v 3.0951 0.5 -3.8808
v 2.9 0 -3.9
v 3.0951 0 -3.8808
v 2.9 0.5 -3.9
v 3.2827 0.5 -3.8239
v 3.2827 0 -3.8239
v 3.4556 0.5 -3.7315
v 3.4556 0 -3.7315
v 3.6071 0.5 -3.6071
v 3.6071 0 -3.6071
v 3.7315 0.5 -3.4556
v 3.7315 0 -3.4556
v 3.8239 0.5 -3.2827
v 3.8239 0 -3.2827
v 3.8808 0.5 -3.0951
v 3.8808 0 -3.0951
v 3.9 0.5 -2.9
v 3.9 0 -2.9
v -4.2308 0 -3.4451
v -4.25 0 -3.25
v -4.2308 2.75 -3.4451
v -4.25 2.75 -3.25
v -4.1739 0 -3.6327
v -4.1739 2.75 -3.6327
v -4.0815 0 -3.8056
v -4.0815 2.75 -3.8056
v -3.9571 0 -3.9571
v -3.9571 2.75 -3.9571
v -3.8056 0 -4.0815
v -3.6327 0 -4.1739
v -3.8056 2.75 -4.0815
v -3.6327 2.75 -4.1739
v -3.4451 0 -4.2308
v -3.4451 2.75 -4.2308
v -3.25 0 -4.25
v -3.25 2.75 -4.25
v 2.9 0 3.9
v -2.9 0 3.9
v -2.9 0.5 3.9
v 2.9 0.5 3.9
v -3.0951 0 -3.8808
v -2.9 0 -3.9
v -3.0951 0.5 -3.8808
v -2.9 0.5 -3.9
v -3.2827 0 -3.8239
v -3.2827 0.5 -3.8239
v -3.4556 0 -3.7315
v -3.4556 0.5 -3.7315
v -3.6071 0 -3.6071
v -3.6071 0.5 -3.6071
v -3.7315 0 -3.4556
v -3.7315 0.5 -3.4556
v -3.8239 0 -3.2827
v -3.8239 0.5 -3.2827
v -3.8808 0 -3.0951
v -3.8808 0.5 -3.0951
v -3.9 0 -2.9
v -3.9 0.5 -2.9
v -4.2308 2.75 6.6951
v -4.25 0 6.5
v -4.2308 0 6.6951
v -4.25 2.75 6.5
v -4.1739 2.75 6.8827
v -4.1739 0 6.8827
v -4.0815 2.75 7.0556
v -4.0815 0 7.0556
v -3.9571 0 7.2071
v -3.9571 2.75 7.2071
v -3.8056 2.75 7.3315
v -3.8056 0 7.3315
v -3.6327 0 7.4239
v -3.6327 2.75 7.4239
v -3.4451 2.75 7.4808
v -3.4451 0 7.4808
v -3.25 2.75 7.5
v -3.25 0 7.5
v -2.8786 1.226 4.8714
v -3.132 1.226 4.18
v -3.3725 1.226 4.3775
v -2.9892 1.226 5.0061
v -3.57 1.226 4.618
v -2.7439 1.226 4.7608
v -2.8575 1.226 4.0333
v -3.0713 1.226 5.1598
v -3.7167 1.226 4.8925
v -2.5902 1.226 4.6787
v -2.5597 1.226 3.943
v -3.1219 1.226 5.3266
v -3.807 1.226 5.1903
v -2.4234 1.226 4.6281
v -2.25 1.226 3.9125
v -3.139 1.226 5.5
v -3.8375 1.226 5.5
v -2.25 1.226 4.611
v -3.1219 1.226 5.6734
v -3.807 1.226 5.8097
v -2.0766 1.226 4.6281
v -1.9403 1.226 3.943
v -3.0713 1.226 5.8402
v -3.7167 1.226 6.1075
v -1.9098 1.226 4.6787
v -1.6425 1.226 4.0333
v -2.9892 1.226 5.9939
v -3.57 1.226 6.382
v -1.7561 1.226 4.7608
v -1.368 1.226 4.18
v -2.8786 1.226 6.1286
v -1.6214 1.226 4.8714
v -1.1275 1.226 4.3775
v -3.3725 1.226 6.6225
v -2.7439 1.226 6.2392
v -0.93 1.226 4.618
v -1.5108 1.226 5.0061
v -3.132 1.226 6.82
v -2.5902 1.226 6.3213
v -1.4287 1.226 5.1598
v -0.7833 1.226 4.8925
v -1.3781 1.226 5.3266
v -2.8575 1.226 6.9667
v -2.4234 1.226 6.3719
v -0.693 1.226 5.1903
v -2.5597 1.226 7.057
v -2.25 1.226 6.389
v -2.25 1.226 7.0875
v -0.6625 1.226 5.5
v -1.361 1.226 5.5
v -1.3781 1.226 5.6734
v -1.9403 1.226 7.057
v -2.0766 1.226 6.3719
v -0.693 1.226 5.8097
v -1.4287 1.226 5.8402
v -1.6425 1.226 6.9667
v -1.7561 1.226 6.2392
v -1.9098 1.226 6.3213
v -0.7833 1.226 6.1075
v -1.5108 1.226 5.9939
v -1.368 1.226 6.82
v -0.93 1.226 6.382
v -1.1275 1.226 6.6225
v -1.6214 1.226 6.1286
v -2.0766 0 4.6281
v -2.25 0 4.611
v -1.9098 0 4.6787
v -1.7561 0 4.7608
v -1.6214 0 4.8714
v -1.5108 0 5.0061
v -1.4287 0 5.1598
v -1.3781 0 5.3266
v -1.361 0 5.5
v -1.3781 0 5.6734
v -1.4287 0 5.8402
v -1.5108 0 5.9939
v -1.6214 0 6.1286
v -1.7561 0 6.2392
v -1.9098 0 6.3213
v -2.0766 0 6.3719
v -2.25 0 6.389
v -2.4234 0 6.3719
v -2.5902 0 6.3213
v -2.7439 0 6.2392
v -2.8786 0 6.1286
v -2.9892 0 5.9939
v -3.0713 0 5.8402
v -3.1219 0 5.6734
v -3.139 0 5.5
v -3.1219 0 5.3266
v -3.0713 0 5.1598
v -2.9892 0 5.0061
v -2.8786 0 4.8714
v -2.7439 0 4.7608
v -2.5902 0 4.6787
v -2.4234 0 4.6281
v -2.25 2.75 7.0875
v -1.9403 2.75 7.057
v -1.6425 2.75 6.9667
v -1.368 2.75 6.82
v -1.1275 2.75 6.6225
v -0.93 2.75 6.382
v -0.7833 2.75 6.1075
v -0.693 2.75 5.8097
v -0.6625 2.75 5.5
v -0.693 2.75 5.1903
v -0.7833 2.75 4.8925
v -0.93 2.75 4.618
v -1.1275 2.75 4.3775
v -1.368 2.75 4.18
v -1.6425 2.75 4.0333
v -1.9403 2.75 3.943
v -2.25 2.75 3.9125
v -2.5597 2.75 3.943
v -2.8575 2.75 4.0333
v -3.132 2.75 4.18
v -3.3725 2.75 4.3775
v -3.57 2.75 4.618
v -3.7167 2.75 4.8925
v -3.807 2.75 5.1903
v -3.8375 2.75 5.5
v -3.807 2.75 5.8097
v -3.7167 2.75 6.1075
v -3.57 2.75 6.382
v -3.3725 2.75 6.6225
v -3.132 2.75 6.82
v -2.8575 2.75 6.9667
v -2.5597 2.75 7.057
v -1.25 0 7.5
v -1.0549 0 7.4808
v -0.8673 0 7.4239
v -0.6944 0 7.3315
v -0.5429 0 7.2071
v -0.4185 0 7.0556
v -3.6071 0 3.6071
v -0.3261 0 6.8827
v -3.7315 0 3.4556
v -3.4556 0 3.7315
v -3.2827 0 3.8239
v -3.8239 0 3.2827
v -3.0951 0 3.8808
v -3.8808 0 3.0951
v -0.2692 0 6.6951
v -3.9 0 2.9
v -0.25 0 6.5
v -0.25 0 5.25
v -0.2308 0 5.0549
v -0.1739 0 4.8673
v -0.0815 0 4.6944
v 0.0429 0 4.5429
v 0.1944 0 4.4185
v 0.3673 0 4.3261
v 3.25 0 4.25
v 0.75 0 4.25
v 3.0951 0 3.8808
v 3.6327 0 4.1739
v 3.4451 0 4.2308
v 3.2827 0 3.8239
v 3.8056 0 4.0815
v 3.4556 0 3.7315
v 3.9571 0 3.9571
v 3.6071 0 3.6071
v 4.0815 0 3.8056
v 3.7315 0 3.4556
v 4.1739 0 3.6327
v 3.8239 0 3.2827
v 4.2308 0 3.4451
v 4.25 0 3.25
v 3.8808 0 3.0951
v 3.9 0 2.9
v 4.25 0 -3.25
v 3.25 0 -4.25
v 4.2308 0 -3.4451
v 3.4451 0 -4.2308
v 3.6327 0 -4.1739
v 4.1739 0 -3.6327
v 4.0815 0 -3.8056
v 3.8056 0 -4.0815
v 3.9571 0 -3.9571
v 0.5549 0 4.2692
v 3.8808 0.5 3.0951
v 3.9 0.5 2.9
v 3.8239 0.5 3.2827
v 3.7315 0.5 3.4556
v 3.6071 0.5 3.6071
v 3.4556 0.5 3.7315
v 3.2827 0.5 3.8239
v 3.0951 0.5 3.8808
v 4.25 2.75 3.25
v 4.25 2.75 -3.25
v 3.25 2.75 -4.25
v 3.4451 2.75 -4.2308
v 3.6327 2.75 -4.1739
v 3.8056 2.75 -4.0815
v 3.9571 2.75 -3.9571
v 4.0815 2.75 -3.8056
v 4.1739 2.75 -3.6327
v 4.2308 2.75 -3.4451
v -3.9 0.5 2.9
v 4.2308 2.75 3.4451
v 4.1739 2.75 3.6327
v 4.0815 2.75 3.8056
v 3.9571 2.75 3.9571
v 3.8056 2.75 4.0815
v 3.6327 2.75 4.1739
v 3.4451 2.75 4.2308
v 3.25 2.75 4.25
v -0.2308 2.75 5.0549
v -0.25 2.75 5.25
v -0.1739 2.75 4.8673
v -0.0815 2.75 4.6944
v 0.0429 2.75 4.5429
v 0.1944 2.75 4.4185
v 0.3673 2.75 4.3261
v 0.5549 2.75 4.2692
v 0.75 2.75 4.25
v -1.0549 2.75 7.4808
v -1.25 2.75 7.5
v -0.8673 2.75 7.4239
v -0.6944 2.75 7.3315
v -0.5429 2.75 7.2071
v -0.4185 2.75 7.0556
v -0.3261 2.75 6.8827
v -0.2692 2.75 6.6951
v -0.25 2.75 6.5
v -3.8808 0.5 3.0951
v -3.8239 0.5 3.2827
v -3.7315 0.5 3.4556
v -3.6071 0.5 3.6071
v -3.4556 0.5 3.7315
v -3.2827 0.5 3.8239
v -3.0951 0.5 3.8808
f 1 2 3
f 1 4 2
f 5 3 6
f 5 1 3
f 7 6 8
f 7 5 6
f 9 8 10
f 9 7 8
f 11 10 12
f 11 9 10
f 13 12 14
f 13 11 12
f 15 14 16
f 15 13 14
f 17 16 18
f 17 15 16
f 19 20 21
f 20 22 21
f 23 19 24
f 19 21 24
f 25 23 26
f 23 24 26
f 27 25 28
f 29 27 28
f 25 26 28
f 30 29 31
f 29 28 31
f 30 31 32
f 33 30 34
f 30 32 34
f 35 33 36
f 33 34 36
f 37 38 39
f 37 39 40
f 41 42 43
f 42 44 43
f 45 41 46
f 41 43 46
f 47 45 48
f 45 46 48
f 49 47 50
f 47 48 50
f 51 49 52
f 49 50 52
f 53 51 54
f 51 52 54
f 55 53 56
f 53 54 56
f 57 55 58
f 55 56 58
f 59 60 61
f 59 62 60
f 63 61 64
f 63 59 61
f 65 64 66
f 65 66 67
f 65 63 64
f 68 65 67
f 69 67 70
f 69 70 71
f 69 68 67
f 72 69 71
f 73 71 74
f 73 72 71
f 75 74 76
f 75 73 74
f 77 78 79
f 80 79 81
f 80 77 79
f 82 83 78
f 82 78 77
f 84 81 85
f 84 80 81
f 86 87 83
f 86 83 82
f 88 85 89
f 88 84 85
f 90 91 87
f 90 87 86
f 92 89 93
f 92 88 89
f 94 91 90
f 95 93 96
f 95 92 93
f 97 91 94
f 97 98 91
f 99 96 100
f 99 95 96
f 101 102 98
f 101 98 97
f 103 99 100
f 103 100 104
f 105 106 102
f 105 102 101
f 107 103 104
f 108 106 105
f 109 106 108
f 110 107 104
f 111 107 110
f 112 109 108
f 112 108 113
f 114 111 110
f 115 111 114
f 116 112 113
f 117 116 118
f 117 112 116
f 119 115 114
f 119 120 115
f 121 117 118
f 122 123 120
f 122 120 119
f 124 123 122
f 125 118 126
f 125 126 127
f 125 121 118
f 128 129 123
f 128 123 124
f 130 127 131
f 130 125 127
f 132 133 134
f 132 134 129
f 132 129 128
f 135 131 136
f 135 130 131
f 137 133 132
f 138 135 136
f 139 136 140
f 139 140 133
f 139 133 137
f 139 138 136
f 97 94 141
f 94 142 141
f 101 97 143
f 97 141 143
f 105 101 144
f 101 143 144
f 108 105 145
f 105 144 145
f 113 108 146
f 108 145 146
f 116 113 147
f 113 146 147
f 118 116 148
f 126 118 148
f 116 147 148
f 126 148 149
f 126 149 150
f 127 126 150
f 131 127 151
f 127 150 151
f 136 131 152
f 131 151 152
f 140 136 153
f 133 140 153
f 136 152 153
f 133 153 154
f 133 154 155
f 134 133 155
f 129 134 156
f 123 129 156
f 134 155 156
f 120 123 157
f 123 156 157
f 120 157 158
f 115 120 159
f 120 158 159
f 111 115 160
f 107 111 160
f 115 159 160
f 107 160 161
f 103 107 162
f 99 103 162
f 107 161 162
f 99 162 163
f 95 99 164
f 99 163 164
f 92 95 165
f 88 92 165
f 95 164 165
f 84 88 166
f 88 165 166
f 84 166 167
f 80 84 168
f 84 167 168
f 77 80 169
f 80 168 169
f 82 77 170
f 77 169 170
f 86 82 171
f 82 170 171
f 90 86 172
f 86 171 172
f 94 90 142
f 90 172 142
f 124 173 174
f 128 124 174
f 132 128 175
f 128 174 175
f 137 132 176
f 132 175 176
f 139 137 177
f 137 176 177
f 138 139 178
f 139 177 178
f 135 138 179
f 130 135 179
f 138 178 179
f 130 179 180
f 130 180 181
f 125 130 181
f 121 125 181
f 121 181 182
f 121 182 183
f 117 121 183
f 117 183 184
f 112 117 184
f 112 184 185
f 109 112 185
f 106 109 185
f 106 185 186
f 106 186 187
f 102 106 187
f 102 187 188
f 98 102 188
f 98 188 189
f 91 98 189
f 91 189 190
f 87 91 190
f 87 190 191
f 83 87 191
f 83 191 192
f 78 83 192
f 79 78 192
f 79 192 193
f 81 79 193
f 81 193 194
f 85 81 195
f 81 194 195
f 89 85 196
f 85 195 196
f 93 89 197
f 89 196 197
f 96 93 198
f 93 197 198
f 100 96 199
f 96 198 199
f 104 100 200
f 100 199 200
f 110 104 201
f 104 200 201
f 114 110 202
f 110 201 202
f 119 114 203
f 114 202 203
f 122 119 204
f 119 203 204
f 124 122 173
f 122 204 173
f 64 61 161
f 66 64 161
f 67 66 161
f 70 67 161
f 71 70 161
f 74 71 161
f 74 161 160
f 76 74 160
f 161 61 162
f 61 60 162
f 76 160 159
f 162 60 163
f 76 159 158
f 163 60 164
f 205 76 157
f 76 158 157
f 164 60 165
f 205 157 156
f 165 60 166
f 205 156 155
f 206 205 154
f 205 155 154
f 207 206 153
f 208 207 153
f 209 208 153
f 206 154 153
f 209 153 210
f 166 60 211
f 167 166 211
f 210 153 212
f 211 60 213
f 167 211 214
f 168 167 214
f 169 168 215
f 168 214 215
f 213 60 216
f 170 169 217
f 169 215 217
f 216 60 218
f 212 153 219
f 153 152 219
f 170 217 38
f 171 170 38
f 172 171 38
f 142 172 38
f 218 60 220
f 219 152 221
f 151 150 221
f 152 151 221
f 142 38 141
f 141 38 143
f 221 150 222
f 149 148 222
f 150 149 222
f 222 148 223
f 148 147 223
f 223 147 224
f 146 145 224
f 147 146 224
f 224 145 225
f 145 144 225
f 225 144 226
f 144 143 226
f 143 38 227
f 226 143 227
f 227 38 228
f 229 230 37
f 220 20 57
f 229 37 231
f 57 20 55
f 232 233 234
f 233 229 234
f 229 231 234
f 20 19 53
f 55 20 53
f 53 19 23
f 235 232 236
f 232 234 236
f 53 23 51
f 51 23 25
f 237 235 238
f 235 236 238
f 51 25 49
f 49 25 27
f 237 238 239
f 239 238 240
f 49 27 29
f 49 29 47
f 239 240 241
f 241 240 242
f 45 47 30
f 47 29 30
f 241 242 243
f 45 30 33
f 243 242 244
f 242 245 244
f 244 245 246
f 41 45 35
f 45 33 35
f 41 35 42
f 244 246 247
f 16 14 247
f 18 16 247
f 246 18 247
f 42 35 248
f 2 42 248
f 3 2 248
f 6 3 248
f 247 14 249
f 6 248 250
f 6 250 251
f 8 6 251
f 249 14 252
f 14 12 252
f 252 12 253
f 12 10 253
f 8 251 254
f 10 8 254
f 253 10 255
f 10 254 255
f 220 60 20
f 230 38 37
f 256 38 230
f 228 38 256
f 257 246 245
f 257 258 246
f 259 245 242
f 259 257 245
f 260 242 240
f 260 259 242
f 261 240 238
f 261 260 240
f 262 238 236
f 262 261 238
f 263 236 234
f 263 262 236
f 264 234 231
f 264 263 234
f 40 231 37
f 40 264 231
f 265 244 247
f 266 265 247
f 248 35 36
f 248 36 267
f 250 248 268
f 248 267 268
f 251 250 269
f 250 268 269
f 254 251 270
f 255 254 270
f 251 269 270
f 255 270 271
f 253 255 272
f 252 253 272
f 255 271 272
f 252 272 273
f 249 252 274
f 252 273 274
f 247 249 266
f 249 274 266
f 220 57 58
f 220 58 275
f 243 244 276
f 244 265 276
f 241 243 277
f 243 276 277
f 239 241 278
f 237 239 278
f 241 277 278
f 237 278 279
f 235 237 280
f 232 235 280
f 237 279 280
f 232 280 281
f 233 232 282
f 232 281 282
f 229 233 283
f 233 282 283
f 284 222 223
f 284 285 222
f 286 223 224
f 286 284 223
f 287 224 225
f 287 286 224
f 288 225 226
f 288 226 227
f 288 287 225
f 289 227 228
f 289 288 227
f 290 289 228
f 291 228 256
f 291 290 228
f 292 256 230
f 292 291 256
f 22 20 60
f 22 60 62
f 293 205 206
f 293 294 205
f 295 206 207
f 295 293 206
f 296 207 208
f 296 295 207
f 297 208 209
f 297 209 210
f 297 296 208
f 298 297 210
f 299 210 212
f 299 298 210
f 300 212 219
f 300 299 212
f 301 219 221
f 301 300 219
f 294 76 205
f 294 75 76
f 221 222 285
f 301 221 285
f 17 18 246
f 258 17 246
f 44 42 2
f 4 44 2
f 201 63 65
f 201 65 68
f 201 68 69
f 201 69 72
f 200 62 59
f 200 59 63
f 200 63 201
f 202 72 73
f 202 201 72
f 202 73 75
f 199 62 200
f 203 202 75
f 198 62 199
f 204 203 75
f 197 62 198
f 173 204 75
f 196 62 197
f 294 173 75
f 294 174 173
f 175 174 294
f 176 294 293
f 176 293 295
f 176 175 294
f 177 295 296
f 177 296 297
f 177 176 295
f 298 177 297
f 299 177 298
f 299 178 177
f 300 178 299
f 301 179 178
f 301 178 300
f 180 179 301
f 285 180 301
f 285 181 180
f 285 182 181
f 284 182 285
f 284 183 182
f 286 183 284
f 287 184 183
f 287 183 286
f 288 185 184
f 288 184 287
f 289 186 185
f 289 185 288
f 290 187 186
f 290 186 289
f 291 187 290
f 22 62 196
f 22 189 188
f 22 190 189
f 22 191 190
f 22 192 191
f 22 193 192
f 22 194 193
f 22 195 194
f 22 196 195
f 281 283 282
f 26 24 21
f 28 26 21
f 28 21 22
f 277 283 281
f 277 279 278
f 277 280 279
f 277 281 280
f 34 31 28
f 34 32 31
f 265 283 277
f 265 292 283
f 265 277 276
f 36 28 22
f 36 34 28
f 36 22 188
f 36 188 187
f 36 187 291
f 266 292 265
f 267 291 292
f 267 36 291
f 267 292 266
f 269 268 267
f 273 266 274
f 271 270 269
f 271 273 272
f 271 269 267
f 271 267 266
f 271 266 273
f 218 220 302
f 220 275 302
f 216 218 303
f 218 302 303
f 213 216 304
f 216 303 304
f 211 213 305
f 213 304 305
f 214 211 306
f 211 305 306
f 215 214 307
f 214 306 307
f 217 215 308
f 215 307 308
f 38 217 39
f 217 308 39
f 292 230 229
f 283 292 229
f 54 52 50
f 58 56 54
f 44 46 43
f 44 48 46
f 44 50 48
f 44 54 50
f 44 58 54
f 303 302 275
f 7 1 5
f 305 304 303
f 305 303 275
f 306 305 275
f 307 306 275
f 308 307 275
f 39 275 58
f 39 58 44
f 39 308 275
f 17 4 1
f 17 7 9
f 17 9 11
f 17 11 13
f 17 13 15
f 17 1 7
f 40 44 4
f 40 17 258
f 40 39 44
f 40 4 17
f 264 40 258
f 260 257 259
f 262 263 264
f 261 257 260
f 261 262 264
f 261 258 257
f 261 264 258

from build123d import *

# Parameters (mm, degrees)
SKETCH1_W                                      = 8.5
SKETCH1_H                                      = 8.5
EXTRUDE1_DEPTH                                 = 2.75
SKETCH8_W                                      = 7.8
SKETCH8_H                                      = 7.8
EXTRUDE6_DEPTH                                 = 0.5
SKETCH3_W                                      = 4
SKETCH3_H                                      = 2.75
EXTRUDE3_DEPTH                                 = 3.25
CBORE_FOR_0_SOCKET_HEAD_CAP_SCREW1_D           = 1.778
CBORE_FOR_0_SOCKET_HEAD_CAP_SCREW1_CBORE_D     = 3.175
CBORE_FOR_0_SOCKET_HEAD_CAP_SCREW1_CBORE_DEPTH = 1.524
FILLET1_R                                      = 1


with BuildPart() as part:
    # Sketch1 → Extrude1 (new body)
    with BuildSketch(Plane(origin=(0, 0, 0), x_dir=(1, 0, 0), z_dir=(0, 1, 0))):
        Rectangle(SKETCH1_W, SKETCH1_H)
    extrude(amount=EXTRUDE1_DEPTH)

    # Sketch8 → Extrude6 (cut)
    with BuildSketch(Plane.XZ):
        Rectangle(SKETCH8_W, SKETCH8_H)
    extrude(amount=-EXTRUDE6_DEPTH, mode=Mode.SUBTRACT)

    # Sketch3 → Extrude3 (add)
    with BuildSketch(Plane.XY.offset(4.25)):
        with Locations((-2.25, 1.375)):
            Rectangle(SKETCH3_W, SKETCH3_H)
    extrude(amount=EXTRUDE3_DEPTH)

    # CBORE for #0 Socket Head Cap Screw1 (through all)
    with Locations(Plane(origin=(-2.25, 2.75, 5.5), x_dir=(0, 0, 1), z_dir=(0, 1, 0))):
        with Locations((0, 0)):
            CounterBoreHole(CBORE_FOR_0_SOCKET_HEAD_CAP_SCREW1_D / 2, CBORE_FOR_0_SOCKET_HEAD_CAP_SCREW1_CBORE_D / 2, CBORE_FOR_0_SOCKET_HEAD_CAP_SCREW1_CBORE_DEPTH)

    # Fillet1
    fillet1_edges = [part.edges().sort_by_distance(p)[0] for p in [
        (-3.9, 0.25, 3.9),
        (-3.9, 0.25, -3.9),
        (3.9, 0.25, -3.9),
        (3.9, 0.25, 3.9),
        (-4.25, 1.375, -4.25),
        (4.25, 1.375, -4.25),
        (-0.25, 1.375, 4.25),
        (4.25, 1.375, 4.25),
        (-0.25, 1.375, 7.5),
        (-4.25, 1.375, 7.5),
    ]]
    fillet(fillet1_edges, radius=FILLET1_R)


solid = part.part
